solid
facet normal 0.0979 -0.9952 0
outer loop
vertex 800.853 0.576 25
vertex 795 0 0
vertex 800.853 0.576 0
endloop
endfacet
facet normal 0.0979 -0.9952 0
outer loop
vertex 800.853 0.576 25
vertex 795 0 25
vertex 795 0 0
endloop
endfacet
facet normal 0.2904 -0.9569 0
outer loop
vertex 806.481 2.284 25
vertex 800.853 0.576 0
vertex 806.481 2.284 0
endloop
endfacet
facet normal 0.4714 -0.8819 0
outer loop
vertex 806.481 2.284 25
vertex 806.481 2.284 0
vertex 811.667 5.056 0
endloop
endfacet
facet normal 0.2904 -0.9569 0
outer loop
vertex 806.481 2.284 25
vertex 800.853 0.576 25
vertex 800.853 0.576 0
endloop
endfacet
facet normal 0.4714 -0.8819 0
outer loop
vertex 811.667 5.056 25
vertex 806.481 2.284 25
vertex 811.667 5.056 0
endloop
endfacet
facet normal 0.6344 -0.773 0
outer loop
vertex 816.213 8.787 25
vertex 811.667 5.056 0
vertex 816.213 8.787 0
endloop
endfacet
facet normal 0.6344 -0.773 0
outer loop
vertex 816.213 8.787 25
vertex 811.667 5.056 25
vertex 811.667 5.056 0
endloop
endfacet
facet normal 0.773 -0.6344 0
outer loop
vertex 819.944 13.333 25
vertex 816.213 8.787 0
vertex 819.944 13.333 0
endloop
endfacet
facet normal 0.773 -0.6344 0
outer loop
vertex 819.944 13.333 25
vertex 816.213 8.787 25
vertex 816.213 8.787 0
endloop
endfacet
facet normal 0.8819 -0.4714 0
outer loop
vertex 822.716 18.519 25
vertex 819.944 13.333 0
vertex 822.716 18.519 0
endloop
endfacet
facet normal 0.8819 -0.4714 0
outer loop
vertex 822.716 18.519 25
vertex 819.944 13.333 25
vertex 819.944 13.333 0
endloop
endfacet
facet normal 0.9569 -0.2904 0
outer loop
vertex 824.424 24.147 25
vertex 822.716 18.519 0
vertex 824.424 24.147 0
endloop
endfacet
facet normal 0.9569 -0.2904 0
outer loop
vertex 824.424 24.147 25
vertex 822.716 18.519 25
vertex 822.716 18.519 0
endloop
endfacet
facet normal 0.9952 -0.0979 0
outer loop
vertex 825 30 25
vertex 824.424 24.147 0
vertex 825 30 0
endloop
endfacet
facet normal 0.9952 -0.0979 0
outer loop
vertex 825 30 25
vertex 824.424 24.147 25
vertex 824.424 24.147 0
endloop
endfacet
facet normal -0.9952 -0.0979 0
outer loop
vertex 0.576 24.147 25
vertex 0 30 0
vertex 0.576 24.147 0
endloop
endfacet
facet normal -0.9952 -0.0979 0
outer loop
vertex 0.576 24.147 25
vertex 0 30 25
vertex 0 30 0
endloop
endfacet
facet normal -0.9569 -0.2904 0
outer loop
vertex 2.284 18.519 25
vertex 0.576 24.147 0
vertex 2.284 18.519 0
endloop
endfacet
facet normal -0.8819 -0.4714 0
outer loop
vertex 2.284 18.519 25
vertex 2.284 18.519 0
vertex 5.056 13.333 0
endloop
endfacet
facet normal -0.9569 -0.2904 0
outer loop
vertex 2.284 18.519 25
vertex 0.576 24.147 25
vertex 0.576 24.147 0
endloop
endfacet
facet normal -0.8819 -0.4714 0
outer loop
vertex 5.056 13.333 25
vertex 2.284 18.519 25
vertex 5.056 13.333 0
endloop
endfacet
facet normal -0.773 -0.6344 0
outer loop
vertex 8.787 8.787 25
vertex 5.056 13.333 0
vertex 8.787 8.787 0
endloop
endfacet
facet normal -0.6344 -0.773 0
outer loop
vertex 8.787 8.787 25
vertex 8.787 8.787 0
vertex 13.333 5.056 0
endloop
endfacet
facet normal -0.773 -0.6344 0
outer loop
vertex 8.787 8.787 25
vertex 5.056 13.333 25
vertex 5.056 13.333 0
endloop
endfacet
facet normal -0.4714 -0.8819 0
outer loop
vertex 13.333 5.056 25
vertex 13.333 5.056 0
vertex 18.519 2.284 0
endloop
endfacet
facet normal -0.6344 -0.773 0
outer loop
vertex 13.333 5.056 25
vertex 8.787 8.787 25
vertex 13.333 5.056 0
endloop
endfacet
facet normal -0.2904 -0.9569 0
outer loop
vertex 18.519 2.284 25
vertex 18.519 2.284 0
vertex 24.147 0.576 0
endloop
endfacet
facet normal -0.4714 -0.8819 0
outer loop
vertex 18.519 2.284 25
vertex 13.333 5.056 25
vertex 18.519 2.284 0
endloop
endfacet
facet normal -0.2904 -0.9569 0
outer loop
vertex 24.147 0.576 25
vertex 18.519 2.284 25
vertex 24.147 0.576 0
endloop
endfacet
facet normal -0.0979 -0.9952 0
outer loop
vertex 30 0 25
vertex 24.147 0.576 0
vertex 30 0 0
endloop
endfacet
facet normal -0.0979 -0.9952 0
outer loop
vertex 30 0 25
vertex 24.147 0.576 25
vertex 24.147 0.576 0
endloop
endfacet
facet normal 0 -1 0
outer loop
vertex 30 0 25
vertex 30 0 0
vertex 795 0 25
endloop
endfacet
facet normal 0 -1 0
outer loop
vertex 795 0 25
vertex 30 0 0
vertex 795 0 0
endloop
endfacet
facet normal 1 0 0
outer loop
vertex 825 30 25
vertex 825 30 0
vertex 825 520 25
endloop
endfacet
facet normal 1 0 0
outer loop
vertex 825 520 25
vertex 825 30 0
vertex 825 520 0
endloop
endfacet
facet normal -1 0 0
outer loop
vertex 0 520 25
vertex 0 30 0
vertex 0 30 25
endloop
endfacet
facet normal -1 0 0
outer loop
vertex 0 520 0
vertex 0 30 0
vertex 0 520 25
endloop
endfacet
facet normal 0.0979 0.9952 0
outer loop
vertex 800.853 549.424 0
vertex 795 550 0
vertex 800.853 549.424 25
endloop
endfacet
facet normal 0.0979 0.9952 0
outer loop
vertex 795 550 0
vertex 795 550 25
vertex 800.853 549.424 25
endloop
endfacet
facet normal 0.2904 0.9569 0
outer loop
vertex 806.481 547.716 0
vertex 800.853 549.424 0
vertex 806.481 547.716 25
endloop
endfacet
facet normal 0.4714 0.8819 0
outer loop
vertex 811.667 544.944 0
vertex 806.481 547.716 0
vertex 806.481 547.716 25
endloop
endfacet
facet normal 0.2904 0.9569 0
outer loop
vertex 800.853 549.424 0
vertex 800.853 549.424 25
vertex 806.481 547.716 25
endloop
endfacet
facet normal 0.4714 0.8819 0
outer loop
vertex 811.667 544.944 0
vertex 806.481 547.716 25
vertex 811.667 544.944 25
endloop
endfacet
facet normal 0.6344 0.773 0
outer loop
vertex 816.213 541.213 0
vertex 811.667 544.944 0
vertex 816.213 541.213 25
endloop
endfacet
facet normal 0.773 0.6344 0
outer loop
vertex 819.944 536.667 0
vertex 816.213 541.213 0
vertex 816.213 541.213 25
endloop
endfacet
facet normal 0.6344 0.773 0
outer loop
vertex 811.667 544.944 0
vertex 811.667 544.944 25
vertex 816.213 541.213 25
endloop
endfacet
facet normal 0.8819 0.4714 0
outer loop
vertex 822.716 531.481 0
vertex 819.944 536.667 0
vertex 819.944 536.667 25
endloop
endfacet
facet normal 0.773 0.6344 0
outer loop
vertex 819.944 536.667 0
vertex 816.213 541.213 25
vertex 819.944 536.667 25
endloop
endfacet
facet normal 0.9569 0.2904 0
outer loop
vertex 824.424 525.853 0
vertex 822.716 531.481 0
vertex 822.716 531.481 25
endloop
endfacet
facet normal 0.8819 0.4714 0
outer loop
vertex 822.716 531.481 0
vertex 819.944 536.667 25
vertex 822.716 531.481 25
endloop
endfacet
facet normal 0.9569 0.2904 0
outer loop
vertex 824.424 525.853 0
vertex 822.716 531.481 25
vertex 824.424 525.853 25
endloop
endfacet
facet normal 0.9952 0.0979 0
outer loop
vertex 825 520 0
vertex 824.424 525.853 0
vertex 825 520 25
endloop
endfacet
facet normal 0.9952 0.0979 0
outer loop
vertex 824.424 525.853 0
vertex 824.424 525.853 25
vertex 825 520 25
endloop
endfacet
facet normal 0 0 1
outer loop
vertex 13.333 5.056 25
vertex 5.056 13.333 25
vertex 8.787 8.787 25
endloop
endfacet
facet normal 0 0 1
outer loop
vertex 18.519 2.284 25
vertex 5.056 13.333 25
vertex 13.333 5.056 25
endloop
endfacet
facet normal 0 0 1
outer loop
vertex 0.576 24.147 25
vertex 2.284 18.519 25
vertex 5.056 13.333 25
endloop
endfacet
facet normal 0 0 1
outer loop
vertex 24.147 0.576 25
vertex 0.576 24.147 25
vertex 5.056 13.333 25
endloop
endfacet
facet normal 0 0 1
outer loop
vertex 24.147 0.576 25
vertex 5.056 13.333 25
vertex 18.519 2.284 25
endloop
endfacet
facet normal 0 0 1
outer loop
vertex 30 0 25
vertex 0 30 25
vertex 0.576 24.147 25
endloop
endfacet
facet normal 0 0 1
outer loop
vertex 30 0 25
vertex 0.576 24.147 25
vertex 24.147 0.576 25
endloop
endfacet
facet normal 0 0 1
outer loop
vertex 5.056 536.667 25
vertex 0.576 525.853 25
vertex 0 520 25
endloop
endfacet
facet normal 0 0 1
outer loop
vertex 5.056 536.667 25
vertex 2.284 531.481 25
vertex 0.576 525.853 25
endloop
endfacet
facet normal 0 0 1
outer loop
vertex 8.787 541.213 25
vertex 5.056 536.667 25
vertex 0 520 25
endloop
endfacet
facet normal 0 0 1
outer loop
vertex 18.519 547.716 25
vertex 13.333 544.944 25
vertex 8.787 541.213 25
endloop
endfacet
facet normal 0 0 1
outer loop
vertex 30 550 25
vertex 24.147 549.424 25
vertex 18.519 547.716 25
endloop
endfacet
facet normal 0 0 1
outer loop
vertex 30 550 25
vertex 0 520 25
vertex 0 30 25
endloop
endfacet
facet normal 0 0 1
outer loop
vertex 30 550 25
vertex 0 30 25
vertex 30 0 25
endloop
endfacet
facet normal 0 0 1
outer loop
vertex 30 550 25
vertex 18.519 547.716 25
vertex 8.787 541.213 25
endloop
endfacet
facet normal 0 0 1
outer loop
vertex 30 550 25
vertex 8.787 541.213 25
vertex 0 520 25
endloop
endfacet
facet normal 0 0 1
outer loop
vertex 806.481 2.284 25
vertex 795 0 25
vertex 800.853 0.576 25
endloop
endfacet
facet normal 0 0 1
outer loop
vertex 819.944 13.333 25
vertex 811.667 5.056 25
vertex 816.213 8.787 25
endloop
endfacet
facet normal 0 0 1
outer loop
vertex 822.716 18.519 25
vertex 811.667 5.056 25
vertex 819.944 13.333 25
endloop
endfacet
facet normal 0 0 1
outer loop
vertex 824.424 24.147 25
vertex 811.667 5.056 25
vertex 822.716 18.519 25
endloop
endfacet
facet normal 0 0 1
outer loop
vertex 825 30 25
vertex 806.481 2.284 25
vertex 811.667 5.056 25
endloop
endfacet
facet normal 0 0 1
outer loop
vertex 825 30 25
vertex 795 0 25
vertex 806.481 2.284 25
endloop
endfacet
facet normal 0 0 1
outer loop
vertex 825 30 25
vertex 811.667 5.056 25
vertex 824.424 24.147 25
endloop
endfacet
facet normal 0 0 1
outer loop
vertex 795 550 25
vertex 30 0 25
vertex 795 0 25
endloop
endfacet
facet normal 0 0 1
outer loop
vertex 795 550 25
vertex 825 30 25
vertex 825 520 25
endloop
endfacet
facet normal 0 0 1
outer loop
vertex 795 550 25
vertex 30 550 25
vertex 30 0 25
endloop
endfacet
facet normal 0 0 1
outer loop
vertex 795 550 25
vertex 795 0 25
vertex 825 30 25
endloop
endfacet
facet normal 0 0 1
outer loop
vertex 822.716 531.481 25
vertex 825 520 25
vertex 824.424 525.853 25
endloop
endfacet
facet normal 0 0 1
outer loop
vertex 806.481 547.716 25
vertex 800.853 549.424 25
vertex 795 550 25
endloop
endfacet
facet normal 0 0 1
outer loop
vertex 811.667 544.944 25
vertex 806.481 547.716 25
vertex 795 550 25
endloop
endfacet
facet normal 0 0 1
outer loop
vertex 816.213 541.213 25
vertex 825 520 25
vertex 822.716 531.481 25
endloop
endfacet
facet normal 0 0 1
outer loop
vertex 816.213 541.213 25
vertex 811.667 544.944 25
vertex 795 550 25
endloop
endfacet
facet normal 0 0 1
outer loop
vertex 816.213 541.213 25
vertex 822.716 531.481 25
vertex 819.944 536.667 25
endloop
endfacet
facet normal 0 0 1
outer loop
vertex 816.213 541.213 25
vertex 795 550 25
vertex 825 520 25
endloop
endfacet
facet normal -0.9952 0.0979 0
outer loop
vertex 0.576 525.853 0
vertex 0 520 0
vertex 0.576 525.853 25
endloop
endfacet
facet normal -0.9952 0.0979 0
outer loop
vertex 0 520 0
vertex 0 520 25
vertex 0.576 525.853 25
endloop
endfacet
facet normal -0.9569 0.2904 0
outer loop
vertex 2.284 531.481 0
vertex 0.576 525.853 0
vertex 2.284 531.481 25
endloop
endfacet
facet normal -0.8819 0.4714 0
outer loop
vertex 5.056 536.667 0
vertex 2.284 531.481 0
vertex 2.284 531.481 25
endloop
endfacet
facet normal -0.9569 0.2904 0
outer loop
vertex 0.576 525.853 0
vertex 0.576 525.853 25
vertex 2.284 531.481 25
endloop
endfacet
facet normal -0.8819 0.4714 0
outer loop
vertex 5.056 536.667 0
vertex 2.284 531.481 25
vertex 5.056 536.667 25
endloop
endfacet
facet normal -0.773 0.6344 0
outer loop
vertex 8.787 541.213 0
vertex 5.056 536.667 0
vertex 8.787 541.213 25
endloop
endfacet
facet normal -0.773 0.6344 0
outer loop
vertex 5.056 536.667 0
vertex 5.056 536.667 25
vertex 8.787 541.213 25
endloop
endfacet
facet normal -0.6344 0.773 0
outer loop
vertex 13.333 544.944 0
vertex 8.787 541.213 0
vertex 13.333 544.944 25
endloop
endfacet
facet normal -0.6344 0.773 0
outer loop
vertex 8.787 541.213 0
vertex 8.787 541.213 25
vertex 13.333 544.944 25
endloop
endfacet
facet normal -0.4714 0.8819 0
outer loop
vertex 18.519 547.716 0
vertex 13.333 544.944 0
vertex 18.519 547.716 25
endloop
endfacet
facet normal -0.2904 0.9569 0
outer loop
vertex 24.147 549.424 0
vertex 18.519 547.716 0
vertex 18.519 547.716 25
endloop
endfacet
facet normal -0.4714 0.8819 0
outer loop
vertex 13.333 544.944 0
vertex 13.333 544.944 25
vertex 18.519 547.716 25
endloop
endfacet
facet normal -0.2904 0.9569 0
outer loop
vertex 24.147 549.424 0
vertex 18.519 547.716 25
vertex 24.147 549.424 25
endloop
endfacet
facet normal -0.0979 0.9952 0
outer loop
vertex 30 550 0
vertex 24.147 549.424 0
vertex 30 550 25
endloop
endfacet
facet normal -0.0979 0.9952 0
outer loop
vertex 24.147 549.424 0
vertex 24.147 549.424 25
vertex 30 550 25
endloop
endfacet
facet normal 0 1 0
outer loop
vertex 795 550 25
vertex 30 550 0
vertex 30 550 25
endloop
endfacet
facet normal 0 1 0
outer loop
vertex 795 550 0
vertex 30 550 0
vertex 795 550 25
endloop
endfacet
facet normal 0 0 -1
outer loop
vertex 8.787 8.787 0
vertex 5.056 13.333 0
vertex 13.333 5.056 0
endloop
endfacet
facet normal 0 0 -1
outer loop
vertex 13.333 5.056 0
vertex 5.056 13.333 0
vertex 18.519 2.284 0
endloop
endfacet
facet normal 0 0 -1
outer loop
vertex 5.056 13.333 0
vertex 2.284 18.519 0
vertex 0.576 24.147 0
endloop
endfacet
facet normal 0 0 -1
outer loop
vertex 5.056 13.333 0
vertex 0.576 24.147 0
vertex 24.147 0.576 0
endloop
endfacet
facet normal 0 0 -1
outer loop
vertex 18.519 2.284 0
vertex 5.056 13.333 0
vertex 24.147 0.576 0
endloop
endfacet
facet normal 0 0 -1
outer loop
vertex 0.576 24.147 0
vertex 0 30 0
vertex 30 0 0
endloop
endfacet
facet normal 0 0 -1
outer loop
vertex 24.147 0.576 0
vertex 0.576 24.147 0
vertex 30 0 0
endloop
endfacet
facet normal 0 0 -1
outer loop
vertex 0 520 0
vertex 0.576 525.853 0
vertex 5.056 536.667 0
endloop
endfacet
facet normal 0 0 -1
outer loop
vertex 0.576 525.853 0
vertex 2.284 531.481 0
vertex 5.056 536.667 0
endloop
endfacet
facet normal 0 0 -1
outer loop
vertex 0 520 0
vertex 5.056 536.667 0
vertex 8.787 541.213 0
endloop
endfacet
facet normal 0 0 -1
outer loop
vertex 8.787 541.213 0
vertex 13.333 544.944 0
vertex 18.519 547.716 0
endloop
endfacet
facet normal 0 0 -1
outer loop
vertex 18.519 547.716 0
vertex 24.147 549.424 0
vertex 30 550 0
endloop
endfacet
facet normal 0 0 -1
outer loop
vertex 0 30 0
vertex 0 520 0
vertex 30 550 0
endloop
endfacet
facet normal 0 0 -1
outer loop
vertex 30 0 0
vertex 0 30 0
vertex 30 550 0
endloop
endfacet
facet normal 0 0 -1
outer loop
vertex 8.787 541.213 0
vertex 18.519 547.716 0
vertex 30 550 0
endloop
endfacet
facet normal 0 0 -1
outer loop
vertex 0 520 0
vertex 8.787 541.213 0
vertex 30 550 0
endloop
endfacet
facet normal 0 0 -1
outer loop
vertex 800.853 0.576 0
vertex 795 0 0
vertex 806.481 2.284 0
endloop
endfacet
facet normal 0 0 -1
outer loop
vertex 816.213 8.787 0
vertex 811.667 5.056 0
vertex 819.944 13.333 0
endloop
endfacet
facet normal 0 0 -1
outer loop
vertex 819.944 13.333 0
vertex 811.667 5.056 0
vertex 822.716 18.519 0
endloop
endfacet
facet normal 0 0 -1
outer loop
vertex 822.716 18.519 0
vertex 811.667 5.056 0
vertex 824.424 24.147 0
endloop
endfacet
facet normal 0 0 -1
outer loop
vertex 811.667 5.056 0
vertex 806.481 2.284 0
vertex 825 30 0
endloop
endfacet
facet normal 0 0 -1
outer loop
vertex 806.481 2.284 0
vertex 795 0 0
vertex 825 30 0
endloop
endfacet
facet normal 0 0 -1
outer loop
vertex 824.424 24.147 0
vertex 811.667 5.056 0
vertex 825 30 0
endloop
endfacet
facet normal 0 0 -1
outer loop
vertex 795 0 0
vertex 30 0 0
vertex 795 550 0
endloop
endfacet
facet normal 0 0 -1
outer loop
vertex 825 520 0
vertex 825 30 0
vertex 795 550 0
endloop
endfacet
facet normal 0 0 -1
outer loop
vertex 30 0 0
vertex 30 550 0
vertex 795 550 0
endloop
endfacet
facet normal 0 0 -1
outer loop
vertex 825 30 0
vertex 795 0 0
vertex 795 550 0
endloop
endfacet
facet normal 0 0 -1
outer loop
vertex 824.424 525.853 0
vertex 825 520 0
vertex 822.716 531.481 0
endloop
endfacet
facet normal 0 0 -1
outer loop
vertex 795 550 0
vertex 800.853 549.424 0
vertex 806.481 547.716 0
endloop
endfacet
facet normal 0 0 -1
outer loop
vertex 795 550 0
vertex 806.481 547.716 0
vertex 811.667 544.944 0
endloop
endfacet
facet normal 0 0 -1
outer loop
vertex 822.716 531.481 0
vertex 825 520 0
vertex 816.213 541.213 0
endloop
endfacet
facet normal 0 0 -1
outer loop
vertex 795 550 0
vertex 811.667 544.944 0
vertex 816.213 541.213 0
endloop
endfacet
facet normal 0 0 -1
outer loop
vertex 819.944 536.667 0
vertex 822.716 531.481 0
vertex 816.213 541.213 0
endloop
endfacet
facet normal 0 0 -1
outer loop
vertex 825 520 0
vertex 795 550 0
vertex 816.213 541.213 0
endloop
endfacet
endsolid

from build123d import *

# Parameters (mm, degrees)
SKETCH1_W           = 825
SKETCH1_H           = 550
BOSS_EXTRUDE1_DEPTH = 25
FILLET1_R           = 30
FILLET2_R           = 30
FILLET3_R           = 30
FILLET4_R           = 30


with BuildPart() as part:
    # Sketch1 → Boss-Extrude1 (new body)
    with BuildSketch(Plane.XY):
        with Locations((412.5, 275)):
            Rectangle(SKETCH1_W, SKETCH1_H)
    extrude(amount=BOSS_EXTRUDE1_DEPTH)

    # Fillet1
    fillet1_edges = [part.edges().sort_by_distance(p)[0] for p in [
        (0, 550, 12.5),
    ]]
    fillet(fillet1_edges, radius=FILLET1_R)

    # Fillet2
    fillet2_edges = [part.edges().sort_by_distance(p)[0] for p in [
        (825, 550, 12.5),
    ]]
    fillet(fillet2_edges, radius=FILLET2_R)

    # Fillet3
    fillet3_edges = [part.edges().sort_by_distance(p)[0] for p in [
        (0, 0, 12.5),
    ]]
    fillet(fillet3_edges, radius=FILLET3_R)

    # Fillet4
    fillet4_edges = [part.edges().sort_by_distance(p)[0] for p in [
        (825, 0, 12.5),
    ]]
    fillet(fillet4_edges, radius=FILLET4_R)


solid = part.part
